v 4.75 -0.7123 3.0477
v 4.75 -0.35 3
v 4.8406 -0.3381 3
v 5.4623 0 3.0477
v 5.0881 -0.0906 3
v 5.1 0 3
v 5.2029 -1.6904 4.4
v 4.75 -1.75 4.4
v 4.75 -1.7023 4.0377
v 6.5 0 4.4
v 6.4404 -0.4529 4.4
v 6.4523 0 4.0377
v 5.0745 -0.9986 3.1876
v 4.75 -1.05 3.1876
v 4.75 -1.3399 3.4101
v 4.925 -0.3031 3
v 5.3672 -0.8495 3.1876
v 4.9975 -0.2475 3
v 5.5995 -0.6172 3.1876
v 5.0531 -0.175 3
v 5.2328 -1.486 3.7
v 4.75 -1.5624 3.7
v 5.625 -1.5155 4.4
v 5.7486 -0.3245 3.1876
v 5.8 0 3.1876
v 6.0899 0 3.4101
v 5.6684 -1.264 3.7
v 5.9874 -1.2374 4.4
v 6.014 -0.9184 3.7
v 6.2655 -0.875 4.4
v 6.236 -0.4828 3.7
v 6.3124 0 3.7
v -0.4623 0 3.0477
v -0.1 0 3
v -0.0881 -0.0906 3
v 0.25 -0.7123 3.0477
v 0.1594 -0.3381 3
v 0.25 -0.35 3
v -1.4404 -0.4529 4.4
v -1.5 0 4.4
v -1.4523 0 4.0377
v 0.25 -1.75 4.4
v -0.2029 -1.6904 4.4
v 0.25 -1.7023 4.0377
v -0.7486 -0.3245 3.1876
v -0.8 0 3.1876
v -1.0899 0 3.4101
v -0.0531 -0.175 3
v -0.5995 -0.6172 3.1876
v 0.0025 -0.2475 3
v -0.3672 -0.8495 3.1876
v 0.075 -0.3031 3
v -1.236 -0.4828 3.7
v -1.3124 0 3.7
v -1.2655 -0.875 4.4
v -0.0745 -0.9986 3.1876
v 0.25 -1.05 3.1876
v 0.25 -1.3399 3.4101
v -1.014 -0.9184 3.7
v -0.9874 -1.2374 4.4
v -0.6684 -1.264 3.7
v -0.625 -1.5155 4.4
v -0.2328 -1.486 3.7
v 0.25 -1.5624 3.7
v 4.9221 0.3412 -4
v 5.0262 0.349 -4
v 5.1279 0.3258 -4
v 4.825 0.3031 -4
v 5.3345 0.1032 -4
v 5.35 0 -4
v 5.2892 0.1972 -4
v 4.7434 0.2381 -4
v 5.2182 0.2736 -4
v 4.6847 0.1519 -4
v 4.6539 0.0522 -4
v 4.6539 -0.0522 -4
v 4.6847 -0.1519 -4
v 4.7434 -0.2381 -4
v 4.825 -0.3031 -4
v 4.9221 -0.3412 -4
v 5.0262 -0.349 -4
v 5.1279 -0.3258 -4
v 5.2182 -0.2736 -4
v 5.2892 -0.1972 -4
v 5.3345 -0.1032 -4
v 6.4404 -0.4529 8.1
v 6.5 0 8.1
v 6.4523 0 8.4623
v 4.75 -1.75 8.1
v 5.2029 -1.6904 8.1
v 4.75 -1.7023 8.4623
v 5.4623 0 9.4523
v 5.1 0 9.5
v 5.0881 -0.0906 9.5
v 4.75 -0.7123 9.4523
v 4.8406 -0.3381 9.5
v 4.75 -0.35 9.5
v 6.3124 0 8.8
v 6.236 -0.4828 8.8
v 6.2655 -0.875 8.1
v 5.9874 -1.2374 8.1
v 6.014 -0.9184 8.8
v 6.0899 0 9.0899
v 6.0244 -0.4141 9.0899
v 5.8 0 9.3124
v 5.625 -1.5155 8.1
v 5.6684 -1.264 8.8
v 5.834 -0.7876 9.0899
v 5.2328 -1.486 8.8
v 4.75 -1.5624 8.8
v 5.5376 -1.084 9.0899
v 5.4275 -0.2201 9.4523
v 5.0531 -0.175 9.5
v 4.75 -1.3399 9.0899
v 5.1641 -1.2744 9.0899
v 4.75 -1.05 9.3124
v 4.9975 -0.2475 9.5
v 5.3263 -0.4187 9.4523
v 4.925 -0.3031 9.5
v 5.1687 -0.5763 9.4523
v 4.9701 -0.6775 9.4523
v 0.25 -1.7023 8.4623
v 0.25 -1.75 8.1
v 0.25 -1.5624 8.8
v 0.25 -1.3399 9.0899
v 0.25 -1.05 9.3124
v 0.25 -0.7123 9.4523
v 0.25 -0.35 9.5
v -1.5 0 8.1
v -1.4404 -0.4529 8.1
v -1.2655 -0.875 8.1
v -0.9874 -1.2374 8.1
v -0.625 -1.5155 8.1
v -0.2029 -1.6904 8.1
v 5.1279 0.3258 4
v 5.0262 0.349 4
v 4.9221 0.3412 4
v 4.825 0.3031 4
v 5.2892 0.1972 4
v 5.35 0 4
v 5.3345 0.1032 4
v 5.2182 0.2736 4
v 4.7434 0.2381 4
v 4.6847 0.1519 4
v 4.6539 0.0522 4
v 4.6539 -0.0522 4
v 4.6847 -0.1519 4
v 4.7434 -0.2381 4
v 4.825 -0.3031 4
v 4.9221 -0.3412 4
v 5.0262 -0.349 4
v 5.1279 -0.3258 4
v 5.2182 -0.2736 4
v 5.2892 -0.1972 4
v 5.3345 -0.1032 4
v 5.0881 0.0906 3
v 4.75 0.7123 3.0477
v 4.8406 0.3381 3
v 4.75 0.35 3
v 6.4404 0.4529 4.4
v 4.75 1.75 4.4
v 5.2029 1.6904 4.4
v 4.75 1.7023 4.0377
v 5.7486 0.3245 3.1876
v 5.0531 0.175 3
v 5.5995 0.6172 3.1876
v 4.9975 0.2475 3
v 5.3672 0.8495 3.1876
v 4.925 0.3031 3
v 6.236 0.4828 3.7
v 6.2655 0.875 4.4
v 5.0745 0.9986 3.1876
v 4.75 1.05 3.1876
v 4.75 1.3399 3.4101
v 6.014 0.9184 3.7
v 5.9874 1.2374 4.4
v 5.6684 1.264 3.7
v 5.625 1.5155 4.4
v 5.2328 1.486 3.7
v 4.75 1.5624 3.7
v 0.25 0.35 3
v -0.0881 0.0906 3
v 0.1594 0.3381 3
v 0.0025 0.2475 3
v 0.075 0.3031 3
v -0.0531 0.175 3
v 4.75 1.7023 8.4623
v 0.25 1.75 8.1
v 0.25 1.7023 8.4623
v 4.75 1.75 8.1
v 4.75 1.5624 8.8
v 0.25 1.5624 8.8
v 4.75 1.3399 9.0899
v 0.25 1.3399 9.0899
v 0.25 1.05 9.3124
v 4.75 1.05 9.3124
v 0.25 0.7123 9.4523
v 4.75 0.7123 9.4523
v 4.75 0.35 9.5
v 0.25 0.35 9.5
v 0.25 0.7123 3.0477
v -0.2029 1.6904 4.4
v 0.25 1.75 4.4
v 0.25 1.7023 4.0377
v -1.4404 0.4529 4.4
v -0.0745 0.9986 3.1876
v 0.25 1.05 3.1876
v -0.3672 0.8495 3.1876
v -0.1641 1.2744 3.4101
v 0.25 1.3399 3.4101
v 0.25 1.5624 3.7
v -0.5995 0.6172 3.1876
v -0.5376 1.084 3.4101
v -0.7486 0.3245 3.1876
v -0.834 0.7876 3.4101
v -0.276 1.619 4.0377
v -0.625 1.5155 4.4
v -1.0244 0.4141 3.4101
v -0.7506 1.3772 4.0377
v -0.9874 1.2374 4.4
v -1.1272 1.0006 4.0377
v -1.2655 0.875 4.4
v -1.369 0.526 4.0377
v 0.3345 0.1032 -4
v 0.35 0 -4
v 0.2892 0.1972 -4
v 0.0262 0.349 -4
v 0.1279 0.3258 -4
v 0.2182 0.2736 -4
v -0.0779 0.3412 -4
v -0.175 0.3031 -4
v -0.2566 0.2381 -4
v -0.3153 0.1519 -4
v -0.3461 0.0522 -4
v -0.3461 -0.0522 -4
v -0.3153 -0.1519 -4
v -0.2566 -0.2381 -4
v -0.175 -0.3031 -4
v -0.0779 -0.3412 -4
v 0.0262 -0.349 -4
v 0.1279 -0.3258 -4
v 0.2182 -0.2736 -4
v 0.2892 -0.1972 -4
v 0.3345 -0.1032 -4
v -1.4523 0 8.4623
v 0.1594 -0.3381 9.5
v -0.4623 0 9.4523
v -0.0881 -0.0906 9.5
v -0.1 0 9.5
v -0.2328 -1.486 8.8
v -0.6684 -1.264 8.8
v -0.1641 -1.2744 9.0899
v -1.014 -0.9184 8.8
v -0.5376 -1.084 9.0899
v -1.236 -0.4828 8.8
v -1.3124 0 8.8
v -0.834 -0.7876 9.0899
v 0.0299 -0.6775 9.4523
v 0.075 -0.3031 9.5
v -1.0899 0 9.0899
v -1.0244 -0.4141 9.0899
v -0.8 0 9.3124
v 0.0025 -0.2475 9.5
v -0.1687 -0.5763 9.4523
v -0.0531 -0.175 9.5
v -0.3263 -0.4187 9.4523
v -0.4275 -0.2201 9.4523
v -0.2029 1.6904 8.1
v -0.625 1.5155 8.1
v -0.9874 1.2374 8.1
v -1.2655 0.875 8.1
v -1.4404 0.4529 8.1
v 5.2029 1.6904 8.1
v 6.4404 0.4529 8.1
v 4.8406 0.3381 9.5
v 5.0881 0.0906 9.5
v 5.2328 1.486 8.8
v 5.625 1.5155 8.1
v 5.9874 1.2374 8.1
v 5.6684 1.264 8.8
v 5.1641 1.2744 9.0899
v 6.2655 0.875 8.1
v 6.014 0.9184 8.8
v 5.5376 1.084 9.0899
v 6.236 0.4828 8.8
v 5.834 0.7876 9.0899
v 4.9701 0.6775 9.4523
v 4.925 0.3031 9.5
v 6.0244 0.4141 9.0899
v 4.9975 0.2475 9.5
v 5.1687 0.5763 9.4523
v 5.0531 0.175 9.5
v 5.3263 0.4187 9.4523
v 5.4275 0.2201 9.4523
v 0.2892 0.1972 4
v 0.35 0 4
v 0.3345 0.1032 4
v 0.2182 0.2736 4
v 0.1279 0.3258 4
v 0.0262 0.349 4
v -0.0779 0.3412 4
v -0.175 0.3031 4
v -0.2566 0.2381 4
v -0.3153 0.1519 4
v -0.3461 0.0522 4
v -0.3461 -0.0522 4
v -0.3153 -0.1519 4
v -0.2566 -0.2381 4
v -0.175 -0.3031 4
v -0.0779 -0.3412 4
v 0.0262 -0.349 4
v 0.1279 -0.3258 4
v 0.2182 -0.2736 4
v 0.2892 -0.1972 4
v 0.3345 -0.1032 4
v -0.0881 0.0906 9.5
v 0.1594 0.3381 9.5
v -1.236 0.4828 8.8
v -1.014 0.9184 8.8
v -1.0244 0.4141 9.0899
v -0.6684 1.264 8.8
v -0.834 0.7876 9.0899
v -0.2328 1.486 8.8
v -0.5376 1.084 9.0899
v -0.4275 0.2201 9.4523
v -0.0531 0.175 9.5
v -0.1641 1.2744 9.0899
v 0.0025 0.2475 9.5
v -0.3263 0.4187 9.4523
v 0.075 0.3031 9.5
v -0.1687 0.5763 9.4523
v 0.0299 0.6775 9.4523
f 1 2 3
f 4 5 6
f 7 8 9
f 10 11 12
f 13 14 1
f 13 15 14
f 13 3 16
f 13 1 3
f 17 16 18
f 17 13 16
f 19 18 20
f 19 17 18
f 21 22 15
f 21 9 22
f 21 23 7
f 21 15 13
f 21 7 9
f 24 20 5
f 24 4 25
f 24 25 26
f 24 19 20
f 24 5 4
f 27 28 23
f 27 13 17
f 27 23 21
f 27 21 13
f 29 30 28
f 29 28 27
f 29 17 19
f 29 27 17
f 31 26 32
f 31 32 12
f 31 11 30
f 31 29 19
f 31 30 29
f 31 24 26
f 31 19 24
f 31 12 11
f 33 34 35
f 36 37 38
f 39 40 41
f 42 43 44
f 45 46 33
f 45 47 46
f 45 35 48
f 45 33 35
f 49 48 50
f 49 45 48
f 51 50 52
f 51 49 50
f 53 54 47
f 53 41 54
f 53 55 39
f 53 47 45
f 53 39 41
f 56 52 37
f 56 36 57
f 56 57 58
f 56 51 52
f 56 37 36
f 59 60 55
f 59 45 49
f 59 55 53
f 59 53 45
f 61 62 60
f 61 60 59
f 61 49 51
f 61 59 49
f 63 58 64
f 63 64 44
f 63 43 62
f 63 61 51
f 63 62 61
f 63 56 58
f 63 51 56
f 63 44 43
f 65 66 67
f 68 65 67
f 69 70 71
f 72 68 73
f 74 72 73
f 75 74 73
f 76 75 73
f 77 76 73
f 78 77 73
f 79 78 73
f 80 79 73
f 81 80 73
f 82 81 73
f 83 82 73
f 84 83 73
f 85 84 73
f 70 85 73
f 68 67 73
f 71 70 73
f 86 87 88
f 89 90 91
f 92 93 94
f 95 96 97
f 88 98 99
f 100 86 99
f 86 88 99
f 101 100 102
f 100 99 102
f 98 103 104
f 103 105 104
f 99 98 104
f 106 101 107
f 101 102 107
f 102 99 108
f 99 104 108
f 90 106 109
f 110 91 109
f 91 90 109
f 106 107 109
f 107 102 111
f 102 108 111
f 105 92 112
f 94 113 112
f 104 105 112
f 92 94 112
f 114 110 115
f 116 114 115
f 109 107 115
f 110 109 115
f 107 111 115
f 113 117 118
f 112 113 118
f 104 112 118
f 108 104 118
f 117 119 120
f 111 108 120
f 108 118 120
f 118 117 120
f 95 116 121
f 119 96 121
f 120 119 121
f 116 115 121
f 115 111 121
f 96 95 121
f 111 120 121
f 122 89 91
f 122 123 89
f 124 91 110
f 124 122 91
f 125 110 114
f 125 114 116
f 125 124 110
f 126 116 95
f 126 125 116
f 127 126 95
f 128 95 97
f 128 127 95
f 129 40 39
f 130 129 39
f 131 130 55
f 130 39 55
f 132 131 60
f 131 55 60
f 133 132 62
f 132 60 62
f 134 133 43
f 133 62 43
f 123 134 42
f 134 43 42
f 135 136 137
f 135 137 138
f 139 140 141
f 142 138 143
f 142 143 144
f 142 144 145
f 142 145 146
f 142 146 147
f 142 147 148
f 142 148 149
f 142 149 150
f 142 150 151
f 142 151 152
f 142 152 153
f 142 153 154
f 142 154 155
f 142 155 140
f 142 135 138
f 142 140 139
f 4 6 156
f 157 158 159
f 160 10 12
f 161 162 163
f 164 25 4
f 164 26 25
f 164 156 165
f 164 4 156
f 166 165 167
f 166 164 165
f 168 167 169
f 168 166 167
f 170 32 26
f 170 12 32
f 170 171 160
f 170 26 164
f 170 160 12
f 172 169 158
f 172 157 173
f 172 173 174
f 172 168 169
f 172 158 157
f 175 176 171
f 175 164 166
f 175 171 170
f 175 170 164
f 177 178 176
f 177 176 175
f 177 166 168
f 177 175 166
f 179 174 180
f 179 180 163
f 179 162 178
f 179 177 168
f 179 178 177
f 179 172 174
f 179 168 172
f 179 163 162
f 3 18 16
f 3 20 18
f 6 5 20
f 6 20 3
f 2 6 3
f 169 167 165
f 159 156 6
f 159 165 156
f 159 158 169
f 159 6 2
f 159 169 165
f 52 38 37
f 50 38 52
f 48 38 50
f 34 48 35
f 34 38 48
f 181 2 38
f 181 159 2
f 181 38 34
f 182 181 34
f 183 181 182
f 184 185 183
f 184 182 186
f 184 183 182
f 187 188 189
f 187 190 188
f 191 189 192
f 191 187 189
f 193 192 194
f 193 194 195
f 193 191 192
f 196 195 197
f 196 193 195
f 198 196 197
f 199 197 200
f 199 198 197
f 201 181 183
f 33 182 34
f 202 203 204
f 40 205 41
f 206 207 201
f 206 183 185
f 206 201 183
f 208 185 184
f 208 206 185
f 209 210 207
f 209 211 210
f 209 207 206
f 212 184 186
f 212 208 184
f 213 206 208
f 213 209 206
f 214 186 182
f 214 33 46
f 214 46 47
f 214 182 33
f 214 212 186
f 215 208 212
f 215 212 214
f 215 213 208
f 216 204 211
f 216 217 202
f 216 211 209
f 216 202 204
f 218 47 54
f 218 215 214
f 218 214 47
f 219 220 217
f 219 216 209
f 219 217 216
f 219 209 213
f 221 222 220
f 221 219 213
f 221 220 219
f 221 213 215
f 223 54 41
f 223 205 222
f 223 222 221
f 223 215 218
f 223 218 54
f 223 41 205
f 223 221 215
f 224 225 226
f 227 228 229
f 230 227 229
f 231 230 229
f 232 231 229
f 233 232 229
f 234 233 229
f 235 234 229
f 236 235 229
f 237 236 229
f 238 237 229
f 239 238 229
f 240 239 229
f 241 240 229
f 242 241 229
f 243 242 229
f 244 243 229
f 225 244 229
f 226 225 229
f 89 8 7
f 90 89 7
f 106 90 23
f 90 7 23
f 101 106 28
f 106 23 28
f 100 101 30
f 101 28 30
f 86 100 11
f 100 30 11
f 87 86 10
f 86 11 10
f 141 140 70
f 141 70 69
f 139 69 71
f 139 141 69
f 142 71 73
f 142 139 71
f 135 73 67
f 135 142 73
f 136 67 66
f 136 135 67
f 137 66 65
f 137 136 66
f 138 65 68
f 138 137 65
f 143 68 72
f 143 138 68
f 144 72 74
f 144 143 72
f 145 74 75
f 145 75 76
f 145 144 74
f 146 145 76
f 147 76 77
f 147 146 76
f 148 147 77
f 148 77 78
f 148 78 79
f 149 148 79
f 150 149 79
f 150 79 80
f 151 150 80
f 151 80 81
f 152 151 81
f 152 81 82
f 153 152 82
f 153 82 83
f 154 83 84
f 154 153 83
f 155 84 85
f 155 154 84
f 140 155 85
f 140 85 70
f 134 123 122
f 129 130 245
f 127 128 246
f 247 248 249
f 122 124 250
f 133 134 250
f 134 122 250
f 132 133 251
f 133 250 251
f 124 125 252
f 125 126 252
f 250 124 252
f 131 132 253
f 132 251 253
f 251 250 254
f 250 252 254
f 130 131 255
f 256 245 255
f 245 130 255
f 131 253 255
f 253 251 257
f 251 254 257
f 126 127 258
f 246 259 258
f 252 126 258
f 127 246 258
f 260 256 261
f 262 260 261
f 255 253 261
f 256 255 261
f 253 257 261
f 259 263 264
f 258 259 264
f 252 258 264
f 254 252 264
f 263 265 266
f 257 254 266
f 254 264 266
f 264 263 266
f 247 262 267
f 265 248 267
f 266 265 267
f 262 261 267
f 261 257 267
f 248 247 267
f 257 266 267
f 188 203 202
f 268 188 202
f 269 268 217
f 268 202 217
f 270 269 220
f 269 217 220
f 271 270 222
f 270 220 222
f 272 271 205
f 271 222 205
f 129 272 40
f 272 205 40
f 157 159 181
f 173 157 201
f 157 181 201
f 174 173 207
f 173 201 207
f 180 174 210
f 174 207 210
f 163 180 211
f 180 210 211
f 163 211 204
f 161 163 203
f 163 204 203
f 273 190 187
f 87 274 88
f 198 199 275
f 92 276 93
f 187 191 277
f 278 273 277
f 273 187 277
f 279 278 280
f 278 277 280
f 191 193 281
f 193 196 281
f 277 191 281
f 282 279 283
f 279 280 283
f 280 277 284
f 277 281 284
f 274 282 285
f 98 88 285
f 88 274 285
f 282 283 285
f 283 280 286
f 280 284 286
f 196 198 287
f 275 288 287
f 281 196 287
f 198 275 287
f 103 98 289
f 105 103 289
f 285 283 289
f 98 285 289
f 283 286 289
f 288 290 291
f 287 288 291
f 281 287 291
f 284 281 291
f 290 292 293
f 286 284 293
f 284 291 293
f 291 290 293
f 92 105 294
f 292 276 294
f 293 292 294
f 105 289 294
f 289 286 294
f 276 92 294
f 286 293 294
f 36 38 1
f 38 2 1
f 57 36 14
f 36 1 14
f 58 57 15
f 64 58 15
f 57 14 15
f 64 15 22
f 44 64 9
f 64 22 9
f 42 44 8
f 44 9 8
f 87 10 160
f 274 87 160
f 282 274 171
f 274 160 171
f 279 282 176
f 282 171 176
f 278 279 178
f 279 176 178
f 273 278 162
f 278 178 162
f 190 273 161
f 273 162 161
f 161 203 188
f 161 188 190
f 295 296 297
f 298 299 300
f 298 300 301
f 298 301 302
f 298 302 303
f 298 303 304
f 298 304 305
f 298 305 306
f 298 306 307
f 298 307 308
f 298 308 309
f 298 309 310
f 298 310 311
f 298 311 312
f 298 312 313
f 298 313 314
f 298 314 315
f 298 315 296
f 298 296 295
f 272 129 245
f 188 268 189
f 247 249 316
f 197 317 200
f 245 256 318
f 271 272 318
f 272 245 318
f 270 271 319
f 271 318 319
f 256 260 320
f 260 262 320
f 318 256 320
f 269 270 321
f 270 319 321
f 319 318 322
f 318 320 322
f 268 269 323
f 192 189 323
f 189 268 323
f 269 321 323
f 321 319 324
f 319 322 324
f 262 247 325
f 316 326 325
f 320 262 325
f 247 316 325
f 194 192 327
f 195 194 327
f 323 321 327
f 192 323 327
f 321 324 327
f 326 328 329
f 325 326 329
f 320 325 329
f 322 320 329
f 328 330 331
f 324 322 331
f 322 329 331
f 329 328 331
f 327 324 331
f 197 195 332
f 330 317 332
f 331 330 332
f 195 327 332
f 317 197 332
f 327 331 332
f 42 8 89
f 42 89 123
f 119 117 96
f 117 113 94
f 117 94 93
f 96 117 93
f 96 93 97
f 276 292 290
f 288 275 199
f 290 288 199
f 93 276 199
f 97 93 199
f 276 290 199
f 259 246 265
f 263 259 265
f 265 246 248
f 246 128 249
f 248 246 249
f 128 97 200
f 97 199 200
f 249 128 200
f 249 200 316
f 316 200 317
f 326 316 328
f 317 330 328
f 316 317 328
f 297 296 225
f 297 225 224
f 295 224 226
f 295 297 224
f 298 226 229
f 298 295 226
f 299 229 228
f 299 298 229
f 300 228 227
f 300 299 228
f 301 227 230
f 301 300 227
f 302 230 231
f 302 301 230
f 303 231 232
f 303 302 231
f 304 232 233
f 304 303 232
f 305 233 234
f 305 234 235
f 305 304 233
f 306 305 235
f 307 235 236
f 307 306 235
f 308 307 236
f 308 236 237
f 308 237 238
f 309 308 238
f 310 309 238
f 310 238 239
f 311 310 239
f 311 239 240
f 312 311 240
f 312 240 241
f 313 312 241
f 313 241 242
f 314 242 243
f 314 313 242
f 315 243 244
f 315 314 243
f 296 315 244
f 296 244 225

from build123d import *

# Parameters (mm, degrees)
SKETCH_R     = 0.35
PAD_DEPTH    = 8
PAD002_DEPTH = 6.5
FILLET_R     = 1.4
FILLET001_R  = 1.4


with BuildPart() as pad:
    # Sketch → Pad (new body)
    with BuildSketch(Plane.XY.offset(4)):
        Circle(SKETCH_R)
        with Locations((5, 0)):
            Circle(SKETCH_R)
    extrude(amount=-PAD_DEPTH)


with BuildPart() as fillet001:
    # Sketch003 → Pad002 (new body)
    with BuildSketch(Plane.XY.offset(3)):
        with BuildLine():
            Line((0.25, 1.75), (4.75, 1.75))
            ThreePointArc((6.5, 0), (5.987437, 1.237437), (4.75, 1.75))
            ThreePointArc((4.75, -1.75), (5.987437, -1.237437), (6.5, 0))
            Line((4.75, -1.75), (0.25, -1.75))
            ThreePointArc((-1.5, 0), (-0.987437, -1.237437), (0.25, -1.75))
            ThreePointArc((0.25, 1.75), (-0.987437, 1.237437), (-1.5, 0))
        make_face()
    extrude(amount=PAD002_DEPTH)

    # Fillet
    fillet_edges = [fillet001.edges().sort_by_distance(p)[0] for p in [
        (2.5, 1.75, 9.5),
        (-0.987437, 1.237437, 9.5),
        (-0.987437, -1.237437, 9.5),
        (2.5, -1.75, 9.5),
        (5.987437, -1.237437, 9.5),
        (5.987437, 1.237437, 9.5),
    ]]
    fillet(fillet_edges, radius=FILLET_R)

    # Fillet001
    fillet001_edges = [fillet001.edges().sort_by_distance(p)[0] for p in [
        (5.987437, -1.237437, 3),
        (5.987437, 1.237437, 3),
        (2.5, 1.75, 3),
        (2.5, -1.75, 3),
        (-0.987437, -1.237437, 3),
        (-0.987437, 1.237437, 3),
    ]]
    fillet(fillet001_edges, radius=FILLET001_R)


solid = Compound([pad.part, fillet001.part])
